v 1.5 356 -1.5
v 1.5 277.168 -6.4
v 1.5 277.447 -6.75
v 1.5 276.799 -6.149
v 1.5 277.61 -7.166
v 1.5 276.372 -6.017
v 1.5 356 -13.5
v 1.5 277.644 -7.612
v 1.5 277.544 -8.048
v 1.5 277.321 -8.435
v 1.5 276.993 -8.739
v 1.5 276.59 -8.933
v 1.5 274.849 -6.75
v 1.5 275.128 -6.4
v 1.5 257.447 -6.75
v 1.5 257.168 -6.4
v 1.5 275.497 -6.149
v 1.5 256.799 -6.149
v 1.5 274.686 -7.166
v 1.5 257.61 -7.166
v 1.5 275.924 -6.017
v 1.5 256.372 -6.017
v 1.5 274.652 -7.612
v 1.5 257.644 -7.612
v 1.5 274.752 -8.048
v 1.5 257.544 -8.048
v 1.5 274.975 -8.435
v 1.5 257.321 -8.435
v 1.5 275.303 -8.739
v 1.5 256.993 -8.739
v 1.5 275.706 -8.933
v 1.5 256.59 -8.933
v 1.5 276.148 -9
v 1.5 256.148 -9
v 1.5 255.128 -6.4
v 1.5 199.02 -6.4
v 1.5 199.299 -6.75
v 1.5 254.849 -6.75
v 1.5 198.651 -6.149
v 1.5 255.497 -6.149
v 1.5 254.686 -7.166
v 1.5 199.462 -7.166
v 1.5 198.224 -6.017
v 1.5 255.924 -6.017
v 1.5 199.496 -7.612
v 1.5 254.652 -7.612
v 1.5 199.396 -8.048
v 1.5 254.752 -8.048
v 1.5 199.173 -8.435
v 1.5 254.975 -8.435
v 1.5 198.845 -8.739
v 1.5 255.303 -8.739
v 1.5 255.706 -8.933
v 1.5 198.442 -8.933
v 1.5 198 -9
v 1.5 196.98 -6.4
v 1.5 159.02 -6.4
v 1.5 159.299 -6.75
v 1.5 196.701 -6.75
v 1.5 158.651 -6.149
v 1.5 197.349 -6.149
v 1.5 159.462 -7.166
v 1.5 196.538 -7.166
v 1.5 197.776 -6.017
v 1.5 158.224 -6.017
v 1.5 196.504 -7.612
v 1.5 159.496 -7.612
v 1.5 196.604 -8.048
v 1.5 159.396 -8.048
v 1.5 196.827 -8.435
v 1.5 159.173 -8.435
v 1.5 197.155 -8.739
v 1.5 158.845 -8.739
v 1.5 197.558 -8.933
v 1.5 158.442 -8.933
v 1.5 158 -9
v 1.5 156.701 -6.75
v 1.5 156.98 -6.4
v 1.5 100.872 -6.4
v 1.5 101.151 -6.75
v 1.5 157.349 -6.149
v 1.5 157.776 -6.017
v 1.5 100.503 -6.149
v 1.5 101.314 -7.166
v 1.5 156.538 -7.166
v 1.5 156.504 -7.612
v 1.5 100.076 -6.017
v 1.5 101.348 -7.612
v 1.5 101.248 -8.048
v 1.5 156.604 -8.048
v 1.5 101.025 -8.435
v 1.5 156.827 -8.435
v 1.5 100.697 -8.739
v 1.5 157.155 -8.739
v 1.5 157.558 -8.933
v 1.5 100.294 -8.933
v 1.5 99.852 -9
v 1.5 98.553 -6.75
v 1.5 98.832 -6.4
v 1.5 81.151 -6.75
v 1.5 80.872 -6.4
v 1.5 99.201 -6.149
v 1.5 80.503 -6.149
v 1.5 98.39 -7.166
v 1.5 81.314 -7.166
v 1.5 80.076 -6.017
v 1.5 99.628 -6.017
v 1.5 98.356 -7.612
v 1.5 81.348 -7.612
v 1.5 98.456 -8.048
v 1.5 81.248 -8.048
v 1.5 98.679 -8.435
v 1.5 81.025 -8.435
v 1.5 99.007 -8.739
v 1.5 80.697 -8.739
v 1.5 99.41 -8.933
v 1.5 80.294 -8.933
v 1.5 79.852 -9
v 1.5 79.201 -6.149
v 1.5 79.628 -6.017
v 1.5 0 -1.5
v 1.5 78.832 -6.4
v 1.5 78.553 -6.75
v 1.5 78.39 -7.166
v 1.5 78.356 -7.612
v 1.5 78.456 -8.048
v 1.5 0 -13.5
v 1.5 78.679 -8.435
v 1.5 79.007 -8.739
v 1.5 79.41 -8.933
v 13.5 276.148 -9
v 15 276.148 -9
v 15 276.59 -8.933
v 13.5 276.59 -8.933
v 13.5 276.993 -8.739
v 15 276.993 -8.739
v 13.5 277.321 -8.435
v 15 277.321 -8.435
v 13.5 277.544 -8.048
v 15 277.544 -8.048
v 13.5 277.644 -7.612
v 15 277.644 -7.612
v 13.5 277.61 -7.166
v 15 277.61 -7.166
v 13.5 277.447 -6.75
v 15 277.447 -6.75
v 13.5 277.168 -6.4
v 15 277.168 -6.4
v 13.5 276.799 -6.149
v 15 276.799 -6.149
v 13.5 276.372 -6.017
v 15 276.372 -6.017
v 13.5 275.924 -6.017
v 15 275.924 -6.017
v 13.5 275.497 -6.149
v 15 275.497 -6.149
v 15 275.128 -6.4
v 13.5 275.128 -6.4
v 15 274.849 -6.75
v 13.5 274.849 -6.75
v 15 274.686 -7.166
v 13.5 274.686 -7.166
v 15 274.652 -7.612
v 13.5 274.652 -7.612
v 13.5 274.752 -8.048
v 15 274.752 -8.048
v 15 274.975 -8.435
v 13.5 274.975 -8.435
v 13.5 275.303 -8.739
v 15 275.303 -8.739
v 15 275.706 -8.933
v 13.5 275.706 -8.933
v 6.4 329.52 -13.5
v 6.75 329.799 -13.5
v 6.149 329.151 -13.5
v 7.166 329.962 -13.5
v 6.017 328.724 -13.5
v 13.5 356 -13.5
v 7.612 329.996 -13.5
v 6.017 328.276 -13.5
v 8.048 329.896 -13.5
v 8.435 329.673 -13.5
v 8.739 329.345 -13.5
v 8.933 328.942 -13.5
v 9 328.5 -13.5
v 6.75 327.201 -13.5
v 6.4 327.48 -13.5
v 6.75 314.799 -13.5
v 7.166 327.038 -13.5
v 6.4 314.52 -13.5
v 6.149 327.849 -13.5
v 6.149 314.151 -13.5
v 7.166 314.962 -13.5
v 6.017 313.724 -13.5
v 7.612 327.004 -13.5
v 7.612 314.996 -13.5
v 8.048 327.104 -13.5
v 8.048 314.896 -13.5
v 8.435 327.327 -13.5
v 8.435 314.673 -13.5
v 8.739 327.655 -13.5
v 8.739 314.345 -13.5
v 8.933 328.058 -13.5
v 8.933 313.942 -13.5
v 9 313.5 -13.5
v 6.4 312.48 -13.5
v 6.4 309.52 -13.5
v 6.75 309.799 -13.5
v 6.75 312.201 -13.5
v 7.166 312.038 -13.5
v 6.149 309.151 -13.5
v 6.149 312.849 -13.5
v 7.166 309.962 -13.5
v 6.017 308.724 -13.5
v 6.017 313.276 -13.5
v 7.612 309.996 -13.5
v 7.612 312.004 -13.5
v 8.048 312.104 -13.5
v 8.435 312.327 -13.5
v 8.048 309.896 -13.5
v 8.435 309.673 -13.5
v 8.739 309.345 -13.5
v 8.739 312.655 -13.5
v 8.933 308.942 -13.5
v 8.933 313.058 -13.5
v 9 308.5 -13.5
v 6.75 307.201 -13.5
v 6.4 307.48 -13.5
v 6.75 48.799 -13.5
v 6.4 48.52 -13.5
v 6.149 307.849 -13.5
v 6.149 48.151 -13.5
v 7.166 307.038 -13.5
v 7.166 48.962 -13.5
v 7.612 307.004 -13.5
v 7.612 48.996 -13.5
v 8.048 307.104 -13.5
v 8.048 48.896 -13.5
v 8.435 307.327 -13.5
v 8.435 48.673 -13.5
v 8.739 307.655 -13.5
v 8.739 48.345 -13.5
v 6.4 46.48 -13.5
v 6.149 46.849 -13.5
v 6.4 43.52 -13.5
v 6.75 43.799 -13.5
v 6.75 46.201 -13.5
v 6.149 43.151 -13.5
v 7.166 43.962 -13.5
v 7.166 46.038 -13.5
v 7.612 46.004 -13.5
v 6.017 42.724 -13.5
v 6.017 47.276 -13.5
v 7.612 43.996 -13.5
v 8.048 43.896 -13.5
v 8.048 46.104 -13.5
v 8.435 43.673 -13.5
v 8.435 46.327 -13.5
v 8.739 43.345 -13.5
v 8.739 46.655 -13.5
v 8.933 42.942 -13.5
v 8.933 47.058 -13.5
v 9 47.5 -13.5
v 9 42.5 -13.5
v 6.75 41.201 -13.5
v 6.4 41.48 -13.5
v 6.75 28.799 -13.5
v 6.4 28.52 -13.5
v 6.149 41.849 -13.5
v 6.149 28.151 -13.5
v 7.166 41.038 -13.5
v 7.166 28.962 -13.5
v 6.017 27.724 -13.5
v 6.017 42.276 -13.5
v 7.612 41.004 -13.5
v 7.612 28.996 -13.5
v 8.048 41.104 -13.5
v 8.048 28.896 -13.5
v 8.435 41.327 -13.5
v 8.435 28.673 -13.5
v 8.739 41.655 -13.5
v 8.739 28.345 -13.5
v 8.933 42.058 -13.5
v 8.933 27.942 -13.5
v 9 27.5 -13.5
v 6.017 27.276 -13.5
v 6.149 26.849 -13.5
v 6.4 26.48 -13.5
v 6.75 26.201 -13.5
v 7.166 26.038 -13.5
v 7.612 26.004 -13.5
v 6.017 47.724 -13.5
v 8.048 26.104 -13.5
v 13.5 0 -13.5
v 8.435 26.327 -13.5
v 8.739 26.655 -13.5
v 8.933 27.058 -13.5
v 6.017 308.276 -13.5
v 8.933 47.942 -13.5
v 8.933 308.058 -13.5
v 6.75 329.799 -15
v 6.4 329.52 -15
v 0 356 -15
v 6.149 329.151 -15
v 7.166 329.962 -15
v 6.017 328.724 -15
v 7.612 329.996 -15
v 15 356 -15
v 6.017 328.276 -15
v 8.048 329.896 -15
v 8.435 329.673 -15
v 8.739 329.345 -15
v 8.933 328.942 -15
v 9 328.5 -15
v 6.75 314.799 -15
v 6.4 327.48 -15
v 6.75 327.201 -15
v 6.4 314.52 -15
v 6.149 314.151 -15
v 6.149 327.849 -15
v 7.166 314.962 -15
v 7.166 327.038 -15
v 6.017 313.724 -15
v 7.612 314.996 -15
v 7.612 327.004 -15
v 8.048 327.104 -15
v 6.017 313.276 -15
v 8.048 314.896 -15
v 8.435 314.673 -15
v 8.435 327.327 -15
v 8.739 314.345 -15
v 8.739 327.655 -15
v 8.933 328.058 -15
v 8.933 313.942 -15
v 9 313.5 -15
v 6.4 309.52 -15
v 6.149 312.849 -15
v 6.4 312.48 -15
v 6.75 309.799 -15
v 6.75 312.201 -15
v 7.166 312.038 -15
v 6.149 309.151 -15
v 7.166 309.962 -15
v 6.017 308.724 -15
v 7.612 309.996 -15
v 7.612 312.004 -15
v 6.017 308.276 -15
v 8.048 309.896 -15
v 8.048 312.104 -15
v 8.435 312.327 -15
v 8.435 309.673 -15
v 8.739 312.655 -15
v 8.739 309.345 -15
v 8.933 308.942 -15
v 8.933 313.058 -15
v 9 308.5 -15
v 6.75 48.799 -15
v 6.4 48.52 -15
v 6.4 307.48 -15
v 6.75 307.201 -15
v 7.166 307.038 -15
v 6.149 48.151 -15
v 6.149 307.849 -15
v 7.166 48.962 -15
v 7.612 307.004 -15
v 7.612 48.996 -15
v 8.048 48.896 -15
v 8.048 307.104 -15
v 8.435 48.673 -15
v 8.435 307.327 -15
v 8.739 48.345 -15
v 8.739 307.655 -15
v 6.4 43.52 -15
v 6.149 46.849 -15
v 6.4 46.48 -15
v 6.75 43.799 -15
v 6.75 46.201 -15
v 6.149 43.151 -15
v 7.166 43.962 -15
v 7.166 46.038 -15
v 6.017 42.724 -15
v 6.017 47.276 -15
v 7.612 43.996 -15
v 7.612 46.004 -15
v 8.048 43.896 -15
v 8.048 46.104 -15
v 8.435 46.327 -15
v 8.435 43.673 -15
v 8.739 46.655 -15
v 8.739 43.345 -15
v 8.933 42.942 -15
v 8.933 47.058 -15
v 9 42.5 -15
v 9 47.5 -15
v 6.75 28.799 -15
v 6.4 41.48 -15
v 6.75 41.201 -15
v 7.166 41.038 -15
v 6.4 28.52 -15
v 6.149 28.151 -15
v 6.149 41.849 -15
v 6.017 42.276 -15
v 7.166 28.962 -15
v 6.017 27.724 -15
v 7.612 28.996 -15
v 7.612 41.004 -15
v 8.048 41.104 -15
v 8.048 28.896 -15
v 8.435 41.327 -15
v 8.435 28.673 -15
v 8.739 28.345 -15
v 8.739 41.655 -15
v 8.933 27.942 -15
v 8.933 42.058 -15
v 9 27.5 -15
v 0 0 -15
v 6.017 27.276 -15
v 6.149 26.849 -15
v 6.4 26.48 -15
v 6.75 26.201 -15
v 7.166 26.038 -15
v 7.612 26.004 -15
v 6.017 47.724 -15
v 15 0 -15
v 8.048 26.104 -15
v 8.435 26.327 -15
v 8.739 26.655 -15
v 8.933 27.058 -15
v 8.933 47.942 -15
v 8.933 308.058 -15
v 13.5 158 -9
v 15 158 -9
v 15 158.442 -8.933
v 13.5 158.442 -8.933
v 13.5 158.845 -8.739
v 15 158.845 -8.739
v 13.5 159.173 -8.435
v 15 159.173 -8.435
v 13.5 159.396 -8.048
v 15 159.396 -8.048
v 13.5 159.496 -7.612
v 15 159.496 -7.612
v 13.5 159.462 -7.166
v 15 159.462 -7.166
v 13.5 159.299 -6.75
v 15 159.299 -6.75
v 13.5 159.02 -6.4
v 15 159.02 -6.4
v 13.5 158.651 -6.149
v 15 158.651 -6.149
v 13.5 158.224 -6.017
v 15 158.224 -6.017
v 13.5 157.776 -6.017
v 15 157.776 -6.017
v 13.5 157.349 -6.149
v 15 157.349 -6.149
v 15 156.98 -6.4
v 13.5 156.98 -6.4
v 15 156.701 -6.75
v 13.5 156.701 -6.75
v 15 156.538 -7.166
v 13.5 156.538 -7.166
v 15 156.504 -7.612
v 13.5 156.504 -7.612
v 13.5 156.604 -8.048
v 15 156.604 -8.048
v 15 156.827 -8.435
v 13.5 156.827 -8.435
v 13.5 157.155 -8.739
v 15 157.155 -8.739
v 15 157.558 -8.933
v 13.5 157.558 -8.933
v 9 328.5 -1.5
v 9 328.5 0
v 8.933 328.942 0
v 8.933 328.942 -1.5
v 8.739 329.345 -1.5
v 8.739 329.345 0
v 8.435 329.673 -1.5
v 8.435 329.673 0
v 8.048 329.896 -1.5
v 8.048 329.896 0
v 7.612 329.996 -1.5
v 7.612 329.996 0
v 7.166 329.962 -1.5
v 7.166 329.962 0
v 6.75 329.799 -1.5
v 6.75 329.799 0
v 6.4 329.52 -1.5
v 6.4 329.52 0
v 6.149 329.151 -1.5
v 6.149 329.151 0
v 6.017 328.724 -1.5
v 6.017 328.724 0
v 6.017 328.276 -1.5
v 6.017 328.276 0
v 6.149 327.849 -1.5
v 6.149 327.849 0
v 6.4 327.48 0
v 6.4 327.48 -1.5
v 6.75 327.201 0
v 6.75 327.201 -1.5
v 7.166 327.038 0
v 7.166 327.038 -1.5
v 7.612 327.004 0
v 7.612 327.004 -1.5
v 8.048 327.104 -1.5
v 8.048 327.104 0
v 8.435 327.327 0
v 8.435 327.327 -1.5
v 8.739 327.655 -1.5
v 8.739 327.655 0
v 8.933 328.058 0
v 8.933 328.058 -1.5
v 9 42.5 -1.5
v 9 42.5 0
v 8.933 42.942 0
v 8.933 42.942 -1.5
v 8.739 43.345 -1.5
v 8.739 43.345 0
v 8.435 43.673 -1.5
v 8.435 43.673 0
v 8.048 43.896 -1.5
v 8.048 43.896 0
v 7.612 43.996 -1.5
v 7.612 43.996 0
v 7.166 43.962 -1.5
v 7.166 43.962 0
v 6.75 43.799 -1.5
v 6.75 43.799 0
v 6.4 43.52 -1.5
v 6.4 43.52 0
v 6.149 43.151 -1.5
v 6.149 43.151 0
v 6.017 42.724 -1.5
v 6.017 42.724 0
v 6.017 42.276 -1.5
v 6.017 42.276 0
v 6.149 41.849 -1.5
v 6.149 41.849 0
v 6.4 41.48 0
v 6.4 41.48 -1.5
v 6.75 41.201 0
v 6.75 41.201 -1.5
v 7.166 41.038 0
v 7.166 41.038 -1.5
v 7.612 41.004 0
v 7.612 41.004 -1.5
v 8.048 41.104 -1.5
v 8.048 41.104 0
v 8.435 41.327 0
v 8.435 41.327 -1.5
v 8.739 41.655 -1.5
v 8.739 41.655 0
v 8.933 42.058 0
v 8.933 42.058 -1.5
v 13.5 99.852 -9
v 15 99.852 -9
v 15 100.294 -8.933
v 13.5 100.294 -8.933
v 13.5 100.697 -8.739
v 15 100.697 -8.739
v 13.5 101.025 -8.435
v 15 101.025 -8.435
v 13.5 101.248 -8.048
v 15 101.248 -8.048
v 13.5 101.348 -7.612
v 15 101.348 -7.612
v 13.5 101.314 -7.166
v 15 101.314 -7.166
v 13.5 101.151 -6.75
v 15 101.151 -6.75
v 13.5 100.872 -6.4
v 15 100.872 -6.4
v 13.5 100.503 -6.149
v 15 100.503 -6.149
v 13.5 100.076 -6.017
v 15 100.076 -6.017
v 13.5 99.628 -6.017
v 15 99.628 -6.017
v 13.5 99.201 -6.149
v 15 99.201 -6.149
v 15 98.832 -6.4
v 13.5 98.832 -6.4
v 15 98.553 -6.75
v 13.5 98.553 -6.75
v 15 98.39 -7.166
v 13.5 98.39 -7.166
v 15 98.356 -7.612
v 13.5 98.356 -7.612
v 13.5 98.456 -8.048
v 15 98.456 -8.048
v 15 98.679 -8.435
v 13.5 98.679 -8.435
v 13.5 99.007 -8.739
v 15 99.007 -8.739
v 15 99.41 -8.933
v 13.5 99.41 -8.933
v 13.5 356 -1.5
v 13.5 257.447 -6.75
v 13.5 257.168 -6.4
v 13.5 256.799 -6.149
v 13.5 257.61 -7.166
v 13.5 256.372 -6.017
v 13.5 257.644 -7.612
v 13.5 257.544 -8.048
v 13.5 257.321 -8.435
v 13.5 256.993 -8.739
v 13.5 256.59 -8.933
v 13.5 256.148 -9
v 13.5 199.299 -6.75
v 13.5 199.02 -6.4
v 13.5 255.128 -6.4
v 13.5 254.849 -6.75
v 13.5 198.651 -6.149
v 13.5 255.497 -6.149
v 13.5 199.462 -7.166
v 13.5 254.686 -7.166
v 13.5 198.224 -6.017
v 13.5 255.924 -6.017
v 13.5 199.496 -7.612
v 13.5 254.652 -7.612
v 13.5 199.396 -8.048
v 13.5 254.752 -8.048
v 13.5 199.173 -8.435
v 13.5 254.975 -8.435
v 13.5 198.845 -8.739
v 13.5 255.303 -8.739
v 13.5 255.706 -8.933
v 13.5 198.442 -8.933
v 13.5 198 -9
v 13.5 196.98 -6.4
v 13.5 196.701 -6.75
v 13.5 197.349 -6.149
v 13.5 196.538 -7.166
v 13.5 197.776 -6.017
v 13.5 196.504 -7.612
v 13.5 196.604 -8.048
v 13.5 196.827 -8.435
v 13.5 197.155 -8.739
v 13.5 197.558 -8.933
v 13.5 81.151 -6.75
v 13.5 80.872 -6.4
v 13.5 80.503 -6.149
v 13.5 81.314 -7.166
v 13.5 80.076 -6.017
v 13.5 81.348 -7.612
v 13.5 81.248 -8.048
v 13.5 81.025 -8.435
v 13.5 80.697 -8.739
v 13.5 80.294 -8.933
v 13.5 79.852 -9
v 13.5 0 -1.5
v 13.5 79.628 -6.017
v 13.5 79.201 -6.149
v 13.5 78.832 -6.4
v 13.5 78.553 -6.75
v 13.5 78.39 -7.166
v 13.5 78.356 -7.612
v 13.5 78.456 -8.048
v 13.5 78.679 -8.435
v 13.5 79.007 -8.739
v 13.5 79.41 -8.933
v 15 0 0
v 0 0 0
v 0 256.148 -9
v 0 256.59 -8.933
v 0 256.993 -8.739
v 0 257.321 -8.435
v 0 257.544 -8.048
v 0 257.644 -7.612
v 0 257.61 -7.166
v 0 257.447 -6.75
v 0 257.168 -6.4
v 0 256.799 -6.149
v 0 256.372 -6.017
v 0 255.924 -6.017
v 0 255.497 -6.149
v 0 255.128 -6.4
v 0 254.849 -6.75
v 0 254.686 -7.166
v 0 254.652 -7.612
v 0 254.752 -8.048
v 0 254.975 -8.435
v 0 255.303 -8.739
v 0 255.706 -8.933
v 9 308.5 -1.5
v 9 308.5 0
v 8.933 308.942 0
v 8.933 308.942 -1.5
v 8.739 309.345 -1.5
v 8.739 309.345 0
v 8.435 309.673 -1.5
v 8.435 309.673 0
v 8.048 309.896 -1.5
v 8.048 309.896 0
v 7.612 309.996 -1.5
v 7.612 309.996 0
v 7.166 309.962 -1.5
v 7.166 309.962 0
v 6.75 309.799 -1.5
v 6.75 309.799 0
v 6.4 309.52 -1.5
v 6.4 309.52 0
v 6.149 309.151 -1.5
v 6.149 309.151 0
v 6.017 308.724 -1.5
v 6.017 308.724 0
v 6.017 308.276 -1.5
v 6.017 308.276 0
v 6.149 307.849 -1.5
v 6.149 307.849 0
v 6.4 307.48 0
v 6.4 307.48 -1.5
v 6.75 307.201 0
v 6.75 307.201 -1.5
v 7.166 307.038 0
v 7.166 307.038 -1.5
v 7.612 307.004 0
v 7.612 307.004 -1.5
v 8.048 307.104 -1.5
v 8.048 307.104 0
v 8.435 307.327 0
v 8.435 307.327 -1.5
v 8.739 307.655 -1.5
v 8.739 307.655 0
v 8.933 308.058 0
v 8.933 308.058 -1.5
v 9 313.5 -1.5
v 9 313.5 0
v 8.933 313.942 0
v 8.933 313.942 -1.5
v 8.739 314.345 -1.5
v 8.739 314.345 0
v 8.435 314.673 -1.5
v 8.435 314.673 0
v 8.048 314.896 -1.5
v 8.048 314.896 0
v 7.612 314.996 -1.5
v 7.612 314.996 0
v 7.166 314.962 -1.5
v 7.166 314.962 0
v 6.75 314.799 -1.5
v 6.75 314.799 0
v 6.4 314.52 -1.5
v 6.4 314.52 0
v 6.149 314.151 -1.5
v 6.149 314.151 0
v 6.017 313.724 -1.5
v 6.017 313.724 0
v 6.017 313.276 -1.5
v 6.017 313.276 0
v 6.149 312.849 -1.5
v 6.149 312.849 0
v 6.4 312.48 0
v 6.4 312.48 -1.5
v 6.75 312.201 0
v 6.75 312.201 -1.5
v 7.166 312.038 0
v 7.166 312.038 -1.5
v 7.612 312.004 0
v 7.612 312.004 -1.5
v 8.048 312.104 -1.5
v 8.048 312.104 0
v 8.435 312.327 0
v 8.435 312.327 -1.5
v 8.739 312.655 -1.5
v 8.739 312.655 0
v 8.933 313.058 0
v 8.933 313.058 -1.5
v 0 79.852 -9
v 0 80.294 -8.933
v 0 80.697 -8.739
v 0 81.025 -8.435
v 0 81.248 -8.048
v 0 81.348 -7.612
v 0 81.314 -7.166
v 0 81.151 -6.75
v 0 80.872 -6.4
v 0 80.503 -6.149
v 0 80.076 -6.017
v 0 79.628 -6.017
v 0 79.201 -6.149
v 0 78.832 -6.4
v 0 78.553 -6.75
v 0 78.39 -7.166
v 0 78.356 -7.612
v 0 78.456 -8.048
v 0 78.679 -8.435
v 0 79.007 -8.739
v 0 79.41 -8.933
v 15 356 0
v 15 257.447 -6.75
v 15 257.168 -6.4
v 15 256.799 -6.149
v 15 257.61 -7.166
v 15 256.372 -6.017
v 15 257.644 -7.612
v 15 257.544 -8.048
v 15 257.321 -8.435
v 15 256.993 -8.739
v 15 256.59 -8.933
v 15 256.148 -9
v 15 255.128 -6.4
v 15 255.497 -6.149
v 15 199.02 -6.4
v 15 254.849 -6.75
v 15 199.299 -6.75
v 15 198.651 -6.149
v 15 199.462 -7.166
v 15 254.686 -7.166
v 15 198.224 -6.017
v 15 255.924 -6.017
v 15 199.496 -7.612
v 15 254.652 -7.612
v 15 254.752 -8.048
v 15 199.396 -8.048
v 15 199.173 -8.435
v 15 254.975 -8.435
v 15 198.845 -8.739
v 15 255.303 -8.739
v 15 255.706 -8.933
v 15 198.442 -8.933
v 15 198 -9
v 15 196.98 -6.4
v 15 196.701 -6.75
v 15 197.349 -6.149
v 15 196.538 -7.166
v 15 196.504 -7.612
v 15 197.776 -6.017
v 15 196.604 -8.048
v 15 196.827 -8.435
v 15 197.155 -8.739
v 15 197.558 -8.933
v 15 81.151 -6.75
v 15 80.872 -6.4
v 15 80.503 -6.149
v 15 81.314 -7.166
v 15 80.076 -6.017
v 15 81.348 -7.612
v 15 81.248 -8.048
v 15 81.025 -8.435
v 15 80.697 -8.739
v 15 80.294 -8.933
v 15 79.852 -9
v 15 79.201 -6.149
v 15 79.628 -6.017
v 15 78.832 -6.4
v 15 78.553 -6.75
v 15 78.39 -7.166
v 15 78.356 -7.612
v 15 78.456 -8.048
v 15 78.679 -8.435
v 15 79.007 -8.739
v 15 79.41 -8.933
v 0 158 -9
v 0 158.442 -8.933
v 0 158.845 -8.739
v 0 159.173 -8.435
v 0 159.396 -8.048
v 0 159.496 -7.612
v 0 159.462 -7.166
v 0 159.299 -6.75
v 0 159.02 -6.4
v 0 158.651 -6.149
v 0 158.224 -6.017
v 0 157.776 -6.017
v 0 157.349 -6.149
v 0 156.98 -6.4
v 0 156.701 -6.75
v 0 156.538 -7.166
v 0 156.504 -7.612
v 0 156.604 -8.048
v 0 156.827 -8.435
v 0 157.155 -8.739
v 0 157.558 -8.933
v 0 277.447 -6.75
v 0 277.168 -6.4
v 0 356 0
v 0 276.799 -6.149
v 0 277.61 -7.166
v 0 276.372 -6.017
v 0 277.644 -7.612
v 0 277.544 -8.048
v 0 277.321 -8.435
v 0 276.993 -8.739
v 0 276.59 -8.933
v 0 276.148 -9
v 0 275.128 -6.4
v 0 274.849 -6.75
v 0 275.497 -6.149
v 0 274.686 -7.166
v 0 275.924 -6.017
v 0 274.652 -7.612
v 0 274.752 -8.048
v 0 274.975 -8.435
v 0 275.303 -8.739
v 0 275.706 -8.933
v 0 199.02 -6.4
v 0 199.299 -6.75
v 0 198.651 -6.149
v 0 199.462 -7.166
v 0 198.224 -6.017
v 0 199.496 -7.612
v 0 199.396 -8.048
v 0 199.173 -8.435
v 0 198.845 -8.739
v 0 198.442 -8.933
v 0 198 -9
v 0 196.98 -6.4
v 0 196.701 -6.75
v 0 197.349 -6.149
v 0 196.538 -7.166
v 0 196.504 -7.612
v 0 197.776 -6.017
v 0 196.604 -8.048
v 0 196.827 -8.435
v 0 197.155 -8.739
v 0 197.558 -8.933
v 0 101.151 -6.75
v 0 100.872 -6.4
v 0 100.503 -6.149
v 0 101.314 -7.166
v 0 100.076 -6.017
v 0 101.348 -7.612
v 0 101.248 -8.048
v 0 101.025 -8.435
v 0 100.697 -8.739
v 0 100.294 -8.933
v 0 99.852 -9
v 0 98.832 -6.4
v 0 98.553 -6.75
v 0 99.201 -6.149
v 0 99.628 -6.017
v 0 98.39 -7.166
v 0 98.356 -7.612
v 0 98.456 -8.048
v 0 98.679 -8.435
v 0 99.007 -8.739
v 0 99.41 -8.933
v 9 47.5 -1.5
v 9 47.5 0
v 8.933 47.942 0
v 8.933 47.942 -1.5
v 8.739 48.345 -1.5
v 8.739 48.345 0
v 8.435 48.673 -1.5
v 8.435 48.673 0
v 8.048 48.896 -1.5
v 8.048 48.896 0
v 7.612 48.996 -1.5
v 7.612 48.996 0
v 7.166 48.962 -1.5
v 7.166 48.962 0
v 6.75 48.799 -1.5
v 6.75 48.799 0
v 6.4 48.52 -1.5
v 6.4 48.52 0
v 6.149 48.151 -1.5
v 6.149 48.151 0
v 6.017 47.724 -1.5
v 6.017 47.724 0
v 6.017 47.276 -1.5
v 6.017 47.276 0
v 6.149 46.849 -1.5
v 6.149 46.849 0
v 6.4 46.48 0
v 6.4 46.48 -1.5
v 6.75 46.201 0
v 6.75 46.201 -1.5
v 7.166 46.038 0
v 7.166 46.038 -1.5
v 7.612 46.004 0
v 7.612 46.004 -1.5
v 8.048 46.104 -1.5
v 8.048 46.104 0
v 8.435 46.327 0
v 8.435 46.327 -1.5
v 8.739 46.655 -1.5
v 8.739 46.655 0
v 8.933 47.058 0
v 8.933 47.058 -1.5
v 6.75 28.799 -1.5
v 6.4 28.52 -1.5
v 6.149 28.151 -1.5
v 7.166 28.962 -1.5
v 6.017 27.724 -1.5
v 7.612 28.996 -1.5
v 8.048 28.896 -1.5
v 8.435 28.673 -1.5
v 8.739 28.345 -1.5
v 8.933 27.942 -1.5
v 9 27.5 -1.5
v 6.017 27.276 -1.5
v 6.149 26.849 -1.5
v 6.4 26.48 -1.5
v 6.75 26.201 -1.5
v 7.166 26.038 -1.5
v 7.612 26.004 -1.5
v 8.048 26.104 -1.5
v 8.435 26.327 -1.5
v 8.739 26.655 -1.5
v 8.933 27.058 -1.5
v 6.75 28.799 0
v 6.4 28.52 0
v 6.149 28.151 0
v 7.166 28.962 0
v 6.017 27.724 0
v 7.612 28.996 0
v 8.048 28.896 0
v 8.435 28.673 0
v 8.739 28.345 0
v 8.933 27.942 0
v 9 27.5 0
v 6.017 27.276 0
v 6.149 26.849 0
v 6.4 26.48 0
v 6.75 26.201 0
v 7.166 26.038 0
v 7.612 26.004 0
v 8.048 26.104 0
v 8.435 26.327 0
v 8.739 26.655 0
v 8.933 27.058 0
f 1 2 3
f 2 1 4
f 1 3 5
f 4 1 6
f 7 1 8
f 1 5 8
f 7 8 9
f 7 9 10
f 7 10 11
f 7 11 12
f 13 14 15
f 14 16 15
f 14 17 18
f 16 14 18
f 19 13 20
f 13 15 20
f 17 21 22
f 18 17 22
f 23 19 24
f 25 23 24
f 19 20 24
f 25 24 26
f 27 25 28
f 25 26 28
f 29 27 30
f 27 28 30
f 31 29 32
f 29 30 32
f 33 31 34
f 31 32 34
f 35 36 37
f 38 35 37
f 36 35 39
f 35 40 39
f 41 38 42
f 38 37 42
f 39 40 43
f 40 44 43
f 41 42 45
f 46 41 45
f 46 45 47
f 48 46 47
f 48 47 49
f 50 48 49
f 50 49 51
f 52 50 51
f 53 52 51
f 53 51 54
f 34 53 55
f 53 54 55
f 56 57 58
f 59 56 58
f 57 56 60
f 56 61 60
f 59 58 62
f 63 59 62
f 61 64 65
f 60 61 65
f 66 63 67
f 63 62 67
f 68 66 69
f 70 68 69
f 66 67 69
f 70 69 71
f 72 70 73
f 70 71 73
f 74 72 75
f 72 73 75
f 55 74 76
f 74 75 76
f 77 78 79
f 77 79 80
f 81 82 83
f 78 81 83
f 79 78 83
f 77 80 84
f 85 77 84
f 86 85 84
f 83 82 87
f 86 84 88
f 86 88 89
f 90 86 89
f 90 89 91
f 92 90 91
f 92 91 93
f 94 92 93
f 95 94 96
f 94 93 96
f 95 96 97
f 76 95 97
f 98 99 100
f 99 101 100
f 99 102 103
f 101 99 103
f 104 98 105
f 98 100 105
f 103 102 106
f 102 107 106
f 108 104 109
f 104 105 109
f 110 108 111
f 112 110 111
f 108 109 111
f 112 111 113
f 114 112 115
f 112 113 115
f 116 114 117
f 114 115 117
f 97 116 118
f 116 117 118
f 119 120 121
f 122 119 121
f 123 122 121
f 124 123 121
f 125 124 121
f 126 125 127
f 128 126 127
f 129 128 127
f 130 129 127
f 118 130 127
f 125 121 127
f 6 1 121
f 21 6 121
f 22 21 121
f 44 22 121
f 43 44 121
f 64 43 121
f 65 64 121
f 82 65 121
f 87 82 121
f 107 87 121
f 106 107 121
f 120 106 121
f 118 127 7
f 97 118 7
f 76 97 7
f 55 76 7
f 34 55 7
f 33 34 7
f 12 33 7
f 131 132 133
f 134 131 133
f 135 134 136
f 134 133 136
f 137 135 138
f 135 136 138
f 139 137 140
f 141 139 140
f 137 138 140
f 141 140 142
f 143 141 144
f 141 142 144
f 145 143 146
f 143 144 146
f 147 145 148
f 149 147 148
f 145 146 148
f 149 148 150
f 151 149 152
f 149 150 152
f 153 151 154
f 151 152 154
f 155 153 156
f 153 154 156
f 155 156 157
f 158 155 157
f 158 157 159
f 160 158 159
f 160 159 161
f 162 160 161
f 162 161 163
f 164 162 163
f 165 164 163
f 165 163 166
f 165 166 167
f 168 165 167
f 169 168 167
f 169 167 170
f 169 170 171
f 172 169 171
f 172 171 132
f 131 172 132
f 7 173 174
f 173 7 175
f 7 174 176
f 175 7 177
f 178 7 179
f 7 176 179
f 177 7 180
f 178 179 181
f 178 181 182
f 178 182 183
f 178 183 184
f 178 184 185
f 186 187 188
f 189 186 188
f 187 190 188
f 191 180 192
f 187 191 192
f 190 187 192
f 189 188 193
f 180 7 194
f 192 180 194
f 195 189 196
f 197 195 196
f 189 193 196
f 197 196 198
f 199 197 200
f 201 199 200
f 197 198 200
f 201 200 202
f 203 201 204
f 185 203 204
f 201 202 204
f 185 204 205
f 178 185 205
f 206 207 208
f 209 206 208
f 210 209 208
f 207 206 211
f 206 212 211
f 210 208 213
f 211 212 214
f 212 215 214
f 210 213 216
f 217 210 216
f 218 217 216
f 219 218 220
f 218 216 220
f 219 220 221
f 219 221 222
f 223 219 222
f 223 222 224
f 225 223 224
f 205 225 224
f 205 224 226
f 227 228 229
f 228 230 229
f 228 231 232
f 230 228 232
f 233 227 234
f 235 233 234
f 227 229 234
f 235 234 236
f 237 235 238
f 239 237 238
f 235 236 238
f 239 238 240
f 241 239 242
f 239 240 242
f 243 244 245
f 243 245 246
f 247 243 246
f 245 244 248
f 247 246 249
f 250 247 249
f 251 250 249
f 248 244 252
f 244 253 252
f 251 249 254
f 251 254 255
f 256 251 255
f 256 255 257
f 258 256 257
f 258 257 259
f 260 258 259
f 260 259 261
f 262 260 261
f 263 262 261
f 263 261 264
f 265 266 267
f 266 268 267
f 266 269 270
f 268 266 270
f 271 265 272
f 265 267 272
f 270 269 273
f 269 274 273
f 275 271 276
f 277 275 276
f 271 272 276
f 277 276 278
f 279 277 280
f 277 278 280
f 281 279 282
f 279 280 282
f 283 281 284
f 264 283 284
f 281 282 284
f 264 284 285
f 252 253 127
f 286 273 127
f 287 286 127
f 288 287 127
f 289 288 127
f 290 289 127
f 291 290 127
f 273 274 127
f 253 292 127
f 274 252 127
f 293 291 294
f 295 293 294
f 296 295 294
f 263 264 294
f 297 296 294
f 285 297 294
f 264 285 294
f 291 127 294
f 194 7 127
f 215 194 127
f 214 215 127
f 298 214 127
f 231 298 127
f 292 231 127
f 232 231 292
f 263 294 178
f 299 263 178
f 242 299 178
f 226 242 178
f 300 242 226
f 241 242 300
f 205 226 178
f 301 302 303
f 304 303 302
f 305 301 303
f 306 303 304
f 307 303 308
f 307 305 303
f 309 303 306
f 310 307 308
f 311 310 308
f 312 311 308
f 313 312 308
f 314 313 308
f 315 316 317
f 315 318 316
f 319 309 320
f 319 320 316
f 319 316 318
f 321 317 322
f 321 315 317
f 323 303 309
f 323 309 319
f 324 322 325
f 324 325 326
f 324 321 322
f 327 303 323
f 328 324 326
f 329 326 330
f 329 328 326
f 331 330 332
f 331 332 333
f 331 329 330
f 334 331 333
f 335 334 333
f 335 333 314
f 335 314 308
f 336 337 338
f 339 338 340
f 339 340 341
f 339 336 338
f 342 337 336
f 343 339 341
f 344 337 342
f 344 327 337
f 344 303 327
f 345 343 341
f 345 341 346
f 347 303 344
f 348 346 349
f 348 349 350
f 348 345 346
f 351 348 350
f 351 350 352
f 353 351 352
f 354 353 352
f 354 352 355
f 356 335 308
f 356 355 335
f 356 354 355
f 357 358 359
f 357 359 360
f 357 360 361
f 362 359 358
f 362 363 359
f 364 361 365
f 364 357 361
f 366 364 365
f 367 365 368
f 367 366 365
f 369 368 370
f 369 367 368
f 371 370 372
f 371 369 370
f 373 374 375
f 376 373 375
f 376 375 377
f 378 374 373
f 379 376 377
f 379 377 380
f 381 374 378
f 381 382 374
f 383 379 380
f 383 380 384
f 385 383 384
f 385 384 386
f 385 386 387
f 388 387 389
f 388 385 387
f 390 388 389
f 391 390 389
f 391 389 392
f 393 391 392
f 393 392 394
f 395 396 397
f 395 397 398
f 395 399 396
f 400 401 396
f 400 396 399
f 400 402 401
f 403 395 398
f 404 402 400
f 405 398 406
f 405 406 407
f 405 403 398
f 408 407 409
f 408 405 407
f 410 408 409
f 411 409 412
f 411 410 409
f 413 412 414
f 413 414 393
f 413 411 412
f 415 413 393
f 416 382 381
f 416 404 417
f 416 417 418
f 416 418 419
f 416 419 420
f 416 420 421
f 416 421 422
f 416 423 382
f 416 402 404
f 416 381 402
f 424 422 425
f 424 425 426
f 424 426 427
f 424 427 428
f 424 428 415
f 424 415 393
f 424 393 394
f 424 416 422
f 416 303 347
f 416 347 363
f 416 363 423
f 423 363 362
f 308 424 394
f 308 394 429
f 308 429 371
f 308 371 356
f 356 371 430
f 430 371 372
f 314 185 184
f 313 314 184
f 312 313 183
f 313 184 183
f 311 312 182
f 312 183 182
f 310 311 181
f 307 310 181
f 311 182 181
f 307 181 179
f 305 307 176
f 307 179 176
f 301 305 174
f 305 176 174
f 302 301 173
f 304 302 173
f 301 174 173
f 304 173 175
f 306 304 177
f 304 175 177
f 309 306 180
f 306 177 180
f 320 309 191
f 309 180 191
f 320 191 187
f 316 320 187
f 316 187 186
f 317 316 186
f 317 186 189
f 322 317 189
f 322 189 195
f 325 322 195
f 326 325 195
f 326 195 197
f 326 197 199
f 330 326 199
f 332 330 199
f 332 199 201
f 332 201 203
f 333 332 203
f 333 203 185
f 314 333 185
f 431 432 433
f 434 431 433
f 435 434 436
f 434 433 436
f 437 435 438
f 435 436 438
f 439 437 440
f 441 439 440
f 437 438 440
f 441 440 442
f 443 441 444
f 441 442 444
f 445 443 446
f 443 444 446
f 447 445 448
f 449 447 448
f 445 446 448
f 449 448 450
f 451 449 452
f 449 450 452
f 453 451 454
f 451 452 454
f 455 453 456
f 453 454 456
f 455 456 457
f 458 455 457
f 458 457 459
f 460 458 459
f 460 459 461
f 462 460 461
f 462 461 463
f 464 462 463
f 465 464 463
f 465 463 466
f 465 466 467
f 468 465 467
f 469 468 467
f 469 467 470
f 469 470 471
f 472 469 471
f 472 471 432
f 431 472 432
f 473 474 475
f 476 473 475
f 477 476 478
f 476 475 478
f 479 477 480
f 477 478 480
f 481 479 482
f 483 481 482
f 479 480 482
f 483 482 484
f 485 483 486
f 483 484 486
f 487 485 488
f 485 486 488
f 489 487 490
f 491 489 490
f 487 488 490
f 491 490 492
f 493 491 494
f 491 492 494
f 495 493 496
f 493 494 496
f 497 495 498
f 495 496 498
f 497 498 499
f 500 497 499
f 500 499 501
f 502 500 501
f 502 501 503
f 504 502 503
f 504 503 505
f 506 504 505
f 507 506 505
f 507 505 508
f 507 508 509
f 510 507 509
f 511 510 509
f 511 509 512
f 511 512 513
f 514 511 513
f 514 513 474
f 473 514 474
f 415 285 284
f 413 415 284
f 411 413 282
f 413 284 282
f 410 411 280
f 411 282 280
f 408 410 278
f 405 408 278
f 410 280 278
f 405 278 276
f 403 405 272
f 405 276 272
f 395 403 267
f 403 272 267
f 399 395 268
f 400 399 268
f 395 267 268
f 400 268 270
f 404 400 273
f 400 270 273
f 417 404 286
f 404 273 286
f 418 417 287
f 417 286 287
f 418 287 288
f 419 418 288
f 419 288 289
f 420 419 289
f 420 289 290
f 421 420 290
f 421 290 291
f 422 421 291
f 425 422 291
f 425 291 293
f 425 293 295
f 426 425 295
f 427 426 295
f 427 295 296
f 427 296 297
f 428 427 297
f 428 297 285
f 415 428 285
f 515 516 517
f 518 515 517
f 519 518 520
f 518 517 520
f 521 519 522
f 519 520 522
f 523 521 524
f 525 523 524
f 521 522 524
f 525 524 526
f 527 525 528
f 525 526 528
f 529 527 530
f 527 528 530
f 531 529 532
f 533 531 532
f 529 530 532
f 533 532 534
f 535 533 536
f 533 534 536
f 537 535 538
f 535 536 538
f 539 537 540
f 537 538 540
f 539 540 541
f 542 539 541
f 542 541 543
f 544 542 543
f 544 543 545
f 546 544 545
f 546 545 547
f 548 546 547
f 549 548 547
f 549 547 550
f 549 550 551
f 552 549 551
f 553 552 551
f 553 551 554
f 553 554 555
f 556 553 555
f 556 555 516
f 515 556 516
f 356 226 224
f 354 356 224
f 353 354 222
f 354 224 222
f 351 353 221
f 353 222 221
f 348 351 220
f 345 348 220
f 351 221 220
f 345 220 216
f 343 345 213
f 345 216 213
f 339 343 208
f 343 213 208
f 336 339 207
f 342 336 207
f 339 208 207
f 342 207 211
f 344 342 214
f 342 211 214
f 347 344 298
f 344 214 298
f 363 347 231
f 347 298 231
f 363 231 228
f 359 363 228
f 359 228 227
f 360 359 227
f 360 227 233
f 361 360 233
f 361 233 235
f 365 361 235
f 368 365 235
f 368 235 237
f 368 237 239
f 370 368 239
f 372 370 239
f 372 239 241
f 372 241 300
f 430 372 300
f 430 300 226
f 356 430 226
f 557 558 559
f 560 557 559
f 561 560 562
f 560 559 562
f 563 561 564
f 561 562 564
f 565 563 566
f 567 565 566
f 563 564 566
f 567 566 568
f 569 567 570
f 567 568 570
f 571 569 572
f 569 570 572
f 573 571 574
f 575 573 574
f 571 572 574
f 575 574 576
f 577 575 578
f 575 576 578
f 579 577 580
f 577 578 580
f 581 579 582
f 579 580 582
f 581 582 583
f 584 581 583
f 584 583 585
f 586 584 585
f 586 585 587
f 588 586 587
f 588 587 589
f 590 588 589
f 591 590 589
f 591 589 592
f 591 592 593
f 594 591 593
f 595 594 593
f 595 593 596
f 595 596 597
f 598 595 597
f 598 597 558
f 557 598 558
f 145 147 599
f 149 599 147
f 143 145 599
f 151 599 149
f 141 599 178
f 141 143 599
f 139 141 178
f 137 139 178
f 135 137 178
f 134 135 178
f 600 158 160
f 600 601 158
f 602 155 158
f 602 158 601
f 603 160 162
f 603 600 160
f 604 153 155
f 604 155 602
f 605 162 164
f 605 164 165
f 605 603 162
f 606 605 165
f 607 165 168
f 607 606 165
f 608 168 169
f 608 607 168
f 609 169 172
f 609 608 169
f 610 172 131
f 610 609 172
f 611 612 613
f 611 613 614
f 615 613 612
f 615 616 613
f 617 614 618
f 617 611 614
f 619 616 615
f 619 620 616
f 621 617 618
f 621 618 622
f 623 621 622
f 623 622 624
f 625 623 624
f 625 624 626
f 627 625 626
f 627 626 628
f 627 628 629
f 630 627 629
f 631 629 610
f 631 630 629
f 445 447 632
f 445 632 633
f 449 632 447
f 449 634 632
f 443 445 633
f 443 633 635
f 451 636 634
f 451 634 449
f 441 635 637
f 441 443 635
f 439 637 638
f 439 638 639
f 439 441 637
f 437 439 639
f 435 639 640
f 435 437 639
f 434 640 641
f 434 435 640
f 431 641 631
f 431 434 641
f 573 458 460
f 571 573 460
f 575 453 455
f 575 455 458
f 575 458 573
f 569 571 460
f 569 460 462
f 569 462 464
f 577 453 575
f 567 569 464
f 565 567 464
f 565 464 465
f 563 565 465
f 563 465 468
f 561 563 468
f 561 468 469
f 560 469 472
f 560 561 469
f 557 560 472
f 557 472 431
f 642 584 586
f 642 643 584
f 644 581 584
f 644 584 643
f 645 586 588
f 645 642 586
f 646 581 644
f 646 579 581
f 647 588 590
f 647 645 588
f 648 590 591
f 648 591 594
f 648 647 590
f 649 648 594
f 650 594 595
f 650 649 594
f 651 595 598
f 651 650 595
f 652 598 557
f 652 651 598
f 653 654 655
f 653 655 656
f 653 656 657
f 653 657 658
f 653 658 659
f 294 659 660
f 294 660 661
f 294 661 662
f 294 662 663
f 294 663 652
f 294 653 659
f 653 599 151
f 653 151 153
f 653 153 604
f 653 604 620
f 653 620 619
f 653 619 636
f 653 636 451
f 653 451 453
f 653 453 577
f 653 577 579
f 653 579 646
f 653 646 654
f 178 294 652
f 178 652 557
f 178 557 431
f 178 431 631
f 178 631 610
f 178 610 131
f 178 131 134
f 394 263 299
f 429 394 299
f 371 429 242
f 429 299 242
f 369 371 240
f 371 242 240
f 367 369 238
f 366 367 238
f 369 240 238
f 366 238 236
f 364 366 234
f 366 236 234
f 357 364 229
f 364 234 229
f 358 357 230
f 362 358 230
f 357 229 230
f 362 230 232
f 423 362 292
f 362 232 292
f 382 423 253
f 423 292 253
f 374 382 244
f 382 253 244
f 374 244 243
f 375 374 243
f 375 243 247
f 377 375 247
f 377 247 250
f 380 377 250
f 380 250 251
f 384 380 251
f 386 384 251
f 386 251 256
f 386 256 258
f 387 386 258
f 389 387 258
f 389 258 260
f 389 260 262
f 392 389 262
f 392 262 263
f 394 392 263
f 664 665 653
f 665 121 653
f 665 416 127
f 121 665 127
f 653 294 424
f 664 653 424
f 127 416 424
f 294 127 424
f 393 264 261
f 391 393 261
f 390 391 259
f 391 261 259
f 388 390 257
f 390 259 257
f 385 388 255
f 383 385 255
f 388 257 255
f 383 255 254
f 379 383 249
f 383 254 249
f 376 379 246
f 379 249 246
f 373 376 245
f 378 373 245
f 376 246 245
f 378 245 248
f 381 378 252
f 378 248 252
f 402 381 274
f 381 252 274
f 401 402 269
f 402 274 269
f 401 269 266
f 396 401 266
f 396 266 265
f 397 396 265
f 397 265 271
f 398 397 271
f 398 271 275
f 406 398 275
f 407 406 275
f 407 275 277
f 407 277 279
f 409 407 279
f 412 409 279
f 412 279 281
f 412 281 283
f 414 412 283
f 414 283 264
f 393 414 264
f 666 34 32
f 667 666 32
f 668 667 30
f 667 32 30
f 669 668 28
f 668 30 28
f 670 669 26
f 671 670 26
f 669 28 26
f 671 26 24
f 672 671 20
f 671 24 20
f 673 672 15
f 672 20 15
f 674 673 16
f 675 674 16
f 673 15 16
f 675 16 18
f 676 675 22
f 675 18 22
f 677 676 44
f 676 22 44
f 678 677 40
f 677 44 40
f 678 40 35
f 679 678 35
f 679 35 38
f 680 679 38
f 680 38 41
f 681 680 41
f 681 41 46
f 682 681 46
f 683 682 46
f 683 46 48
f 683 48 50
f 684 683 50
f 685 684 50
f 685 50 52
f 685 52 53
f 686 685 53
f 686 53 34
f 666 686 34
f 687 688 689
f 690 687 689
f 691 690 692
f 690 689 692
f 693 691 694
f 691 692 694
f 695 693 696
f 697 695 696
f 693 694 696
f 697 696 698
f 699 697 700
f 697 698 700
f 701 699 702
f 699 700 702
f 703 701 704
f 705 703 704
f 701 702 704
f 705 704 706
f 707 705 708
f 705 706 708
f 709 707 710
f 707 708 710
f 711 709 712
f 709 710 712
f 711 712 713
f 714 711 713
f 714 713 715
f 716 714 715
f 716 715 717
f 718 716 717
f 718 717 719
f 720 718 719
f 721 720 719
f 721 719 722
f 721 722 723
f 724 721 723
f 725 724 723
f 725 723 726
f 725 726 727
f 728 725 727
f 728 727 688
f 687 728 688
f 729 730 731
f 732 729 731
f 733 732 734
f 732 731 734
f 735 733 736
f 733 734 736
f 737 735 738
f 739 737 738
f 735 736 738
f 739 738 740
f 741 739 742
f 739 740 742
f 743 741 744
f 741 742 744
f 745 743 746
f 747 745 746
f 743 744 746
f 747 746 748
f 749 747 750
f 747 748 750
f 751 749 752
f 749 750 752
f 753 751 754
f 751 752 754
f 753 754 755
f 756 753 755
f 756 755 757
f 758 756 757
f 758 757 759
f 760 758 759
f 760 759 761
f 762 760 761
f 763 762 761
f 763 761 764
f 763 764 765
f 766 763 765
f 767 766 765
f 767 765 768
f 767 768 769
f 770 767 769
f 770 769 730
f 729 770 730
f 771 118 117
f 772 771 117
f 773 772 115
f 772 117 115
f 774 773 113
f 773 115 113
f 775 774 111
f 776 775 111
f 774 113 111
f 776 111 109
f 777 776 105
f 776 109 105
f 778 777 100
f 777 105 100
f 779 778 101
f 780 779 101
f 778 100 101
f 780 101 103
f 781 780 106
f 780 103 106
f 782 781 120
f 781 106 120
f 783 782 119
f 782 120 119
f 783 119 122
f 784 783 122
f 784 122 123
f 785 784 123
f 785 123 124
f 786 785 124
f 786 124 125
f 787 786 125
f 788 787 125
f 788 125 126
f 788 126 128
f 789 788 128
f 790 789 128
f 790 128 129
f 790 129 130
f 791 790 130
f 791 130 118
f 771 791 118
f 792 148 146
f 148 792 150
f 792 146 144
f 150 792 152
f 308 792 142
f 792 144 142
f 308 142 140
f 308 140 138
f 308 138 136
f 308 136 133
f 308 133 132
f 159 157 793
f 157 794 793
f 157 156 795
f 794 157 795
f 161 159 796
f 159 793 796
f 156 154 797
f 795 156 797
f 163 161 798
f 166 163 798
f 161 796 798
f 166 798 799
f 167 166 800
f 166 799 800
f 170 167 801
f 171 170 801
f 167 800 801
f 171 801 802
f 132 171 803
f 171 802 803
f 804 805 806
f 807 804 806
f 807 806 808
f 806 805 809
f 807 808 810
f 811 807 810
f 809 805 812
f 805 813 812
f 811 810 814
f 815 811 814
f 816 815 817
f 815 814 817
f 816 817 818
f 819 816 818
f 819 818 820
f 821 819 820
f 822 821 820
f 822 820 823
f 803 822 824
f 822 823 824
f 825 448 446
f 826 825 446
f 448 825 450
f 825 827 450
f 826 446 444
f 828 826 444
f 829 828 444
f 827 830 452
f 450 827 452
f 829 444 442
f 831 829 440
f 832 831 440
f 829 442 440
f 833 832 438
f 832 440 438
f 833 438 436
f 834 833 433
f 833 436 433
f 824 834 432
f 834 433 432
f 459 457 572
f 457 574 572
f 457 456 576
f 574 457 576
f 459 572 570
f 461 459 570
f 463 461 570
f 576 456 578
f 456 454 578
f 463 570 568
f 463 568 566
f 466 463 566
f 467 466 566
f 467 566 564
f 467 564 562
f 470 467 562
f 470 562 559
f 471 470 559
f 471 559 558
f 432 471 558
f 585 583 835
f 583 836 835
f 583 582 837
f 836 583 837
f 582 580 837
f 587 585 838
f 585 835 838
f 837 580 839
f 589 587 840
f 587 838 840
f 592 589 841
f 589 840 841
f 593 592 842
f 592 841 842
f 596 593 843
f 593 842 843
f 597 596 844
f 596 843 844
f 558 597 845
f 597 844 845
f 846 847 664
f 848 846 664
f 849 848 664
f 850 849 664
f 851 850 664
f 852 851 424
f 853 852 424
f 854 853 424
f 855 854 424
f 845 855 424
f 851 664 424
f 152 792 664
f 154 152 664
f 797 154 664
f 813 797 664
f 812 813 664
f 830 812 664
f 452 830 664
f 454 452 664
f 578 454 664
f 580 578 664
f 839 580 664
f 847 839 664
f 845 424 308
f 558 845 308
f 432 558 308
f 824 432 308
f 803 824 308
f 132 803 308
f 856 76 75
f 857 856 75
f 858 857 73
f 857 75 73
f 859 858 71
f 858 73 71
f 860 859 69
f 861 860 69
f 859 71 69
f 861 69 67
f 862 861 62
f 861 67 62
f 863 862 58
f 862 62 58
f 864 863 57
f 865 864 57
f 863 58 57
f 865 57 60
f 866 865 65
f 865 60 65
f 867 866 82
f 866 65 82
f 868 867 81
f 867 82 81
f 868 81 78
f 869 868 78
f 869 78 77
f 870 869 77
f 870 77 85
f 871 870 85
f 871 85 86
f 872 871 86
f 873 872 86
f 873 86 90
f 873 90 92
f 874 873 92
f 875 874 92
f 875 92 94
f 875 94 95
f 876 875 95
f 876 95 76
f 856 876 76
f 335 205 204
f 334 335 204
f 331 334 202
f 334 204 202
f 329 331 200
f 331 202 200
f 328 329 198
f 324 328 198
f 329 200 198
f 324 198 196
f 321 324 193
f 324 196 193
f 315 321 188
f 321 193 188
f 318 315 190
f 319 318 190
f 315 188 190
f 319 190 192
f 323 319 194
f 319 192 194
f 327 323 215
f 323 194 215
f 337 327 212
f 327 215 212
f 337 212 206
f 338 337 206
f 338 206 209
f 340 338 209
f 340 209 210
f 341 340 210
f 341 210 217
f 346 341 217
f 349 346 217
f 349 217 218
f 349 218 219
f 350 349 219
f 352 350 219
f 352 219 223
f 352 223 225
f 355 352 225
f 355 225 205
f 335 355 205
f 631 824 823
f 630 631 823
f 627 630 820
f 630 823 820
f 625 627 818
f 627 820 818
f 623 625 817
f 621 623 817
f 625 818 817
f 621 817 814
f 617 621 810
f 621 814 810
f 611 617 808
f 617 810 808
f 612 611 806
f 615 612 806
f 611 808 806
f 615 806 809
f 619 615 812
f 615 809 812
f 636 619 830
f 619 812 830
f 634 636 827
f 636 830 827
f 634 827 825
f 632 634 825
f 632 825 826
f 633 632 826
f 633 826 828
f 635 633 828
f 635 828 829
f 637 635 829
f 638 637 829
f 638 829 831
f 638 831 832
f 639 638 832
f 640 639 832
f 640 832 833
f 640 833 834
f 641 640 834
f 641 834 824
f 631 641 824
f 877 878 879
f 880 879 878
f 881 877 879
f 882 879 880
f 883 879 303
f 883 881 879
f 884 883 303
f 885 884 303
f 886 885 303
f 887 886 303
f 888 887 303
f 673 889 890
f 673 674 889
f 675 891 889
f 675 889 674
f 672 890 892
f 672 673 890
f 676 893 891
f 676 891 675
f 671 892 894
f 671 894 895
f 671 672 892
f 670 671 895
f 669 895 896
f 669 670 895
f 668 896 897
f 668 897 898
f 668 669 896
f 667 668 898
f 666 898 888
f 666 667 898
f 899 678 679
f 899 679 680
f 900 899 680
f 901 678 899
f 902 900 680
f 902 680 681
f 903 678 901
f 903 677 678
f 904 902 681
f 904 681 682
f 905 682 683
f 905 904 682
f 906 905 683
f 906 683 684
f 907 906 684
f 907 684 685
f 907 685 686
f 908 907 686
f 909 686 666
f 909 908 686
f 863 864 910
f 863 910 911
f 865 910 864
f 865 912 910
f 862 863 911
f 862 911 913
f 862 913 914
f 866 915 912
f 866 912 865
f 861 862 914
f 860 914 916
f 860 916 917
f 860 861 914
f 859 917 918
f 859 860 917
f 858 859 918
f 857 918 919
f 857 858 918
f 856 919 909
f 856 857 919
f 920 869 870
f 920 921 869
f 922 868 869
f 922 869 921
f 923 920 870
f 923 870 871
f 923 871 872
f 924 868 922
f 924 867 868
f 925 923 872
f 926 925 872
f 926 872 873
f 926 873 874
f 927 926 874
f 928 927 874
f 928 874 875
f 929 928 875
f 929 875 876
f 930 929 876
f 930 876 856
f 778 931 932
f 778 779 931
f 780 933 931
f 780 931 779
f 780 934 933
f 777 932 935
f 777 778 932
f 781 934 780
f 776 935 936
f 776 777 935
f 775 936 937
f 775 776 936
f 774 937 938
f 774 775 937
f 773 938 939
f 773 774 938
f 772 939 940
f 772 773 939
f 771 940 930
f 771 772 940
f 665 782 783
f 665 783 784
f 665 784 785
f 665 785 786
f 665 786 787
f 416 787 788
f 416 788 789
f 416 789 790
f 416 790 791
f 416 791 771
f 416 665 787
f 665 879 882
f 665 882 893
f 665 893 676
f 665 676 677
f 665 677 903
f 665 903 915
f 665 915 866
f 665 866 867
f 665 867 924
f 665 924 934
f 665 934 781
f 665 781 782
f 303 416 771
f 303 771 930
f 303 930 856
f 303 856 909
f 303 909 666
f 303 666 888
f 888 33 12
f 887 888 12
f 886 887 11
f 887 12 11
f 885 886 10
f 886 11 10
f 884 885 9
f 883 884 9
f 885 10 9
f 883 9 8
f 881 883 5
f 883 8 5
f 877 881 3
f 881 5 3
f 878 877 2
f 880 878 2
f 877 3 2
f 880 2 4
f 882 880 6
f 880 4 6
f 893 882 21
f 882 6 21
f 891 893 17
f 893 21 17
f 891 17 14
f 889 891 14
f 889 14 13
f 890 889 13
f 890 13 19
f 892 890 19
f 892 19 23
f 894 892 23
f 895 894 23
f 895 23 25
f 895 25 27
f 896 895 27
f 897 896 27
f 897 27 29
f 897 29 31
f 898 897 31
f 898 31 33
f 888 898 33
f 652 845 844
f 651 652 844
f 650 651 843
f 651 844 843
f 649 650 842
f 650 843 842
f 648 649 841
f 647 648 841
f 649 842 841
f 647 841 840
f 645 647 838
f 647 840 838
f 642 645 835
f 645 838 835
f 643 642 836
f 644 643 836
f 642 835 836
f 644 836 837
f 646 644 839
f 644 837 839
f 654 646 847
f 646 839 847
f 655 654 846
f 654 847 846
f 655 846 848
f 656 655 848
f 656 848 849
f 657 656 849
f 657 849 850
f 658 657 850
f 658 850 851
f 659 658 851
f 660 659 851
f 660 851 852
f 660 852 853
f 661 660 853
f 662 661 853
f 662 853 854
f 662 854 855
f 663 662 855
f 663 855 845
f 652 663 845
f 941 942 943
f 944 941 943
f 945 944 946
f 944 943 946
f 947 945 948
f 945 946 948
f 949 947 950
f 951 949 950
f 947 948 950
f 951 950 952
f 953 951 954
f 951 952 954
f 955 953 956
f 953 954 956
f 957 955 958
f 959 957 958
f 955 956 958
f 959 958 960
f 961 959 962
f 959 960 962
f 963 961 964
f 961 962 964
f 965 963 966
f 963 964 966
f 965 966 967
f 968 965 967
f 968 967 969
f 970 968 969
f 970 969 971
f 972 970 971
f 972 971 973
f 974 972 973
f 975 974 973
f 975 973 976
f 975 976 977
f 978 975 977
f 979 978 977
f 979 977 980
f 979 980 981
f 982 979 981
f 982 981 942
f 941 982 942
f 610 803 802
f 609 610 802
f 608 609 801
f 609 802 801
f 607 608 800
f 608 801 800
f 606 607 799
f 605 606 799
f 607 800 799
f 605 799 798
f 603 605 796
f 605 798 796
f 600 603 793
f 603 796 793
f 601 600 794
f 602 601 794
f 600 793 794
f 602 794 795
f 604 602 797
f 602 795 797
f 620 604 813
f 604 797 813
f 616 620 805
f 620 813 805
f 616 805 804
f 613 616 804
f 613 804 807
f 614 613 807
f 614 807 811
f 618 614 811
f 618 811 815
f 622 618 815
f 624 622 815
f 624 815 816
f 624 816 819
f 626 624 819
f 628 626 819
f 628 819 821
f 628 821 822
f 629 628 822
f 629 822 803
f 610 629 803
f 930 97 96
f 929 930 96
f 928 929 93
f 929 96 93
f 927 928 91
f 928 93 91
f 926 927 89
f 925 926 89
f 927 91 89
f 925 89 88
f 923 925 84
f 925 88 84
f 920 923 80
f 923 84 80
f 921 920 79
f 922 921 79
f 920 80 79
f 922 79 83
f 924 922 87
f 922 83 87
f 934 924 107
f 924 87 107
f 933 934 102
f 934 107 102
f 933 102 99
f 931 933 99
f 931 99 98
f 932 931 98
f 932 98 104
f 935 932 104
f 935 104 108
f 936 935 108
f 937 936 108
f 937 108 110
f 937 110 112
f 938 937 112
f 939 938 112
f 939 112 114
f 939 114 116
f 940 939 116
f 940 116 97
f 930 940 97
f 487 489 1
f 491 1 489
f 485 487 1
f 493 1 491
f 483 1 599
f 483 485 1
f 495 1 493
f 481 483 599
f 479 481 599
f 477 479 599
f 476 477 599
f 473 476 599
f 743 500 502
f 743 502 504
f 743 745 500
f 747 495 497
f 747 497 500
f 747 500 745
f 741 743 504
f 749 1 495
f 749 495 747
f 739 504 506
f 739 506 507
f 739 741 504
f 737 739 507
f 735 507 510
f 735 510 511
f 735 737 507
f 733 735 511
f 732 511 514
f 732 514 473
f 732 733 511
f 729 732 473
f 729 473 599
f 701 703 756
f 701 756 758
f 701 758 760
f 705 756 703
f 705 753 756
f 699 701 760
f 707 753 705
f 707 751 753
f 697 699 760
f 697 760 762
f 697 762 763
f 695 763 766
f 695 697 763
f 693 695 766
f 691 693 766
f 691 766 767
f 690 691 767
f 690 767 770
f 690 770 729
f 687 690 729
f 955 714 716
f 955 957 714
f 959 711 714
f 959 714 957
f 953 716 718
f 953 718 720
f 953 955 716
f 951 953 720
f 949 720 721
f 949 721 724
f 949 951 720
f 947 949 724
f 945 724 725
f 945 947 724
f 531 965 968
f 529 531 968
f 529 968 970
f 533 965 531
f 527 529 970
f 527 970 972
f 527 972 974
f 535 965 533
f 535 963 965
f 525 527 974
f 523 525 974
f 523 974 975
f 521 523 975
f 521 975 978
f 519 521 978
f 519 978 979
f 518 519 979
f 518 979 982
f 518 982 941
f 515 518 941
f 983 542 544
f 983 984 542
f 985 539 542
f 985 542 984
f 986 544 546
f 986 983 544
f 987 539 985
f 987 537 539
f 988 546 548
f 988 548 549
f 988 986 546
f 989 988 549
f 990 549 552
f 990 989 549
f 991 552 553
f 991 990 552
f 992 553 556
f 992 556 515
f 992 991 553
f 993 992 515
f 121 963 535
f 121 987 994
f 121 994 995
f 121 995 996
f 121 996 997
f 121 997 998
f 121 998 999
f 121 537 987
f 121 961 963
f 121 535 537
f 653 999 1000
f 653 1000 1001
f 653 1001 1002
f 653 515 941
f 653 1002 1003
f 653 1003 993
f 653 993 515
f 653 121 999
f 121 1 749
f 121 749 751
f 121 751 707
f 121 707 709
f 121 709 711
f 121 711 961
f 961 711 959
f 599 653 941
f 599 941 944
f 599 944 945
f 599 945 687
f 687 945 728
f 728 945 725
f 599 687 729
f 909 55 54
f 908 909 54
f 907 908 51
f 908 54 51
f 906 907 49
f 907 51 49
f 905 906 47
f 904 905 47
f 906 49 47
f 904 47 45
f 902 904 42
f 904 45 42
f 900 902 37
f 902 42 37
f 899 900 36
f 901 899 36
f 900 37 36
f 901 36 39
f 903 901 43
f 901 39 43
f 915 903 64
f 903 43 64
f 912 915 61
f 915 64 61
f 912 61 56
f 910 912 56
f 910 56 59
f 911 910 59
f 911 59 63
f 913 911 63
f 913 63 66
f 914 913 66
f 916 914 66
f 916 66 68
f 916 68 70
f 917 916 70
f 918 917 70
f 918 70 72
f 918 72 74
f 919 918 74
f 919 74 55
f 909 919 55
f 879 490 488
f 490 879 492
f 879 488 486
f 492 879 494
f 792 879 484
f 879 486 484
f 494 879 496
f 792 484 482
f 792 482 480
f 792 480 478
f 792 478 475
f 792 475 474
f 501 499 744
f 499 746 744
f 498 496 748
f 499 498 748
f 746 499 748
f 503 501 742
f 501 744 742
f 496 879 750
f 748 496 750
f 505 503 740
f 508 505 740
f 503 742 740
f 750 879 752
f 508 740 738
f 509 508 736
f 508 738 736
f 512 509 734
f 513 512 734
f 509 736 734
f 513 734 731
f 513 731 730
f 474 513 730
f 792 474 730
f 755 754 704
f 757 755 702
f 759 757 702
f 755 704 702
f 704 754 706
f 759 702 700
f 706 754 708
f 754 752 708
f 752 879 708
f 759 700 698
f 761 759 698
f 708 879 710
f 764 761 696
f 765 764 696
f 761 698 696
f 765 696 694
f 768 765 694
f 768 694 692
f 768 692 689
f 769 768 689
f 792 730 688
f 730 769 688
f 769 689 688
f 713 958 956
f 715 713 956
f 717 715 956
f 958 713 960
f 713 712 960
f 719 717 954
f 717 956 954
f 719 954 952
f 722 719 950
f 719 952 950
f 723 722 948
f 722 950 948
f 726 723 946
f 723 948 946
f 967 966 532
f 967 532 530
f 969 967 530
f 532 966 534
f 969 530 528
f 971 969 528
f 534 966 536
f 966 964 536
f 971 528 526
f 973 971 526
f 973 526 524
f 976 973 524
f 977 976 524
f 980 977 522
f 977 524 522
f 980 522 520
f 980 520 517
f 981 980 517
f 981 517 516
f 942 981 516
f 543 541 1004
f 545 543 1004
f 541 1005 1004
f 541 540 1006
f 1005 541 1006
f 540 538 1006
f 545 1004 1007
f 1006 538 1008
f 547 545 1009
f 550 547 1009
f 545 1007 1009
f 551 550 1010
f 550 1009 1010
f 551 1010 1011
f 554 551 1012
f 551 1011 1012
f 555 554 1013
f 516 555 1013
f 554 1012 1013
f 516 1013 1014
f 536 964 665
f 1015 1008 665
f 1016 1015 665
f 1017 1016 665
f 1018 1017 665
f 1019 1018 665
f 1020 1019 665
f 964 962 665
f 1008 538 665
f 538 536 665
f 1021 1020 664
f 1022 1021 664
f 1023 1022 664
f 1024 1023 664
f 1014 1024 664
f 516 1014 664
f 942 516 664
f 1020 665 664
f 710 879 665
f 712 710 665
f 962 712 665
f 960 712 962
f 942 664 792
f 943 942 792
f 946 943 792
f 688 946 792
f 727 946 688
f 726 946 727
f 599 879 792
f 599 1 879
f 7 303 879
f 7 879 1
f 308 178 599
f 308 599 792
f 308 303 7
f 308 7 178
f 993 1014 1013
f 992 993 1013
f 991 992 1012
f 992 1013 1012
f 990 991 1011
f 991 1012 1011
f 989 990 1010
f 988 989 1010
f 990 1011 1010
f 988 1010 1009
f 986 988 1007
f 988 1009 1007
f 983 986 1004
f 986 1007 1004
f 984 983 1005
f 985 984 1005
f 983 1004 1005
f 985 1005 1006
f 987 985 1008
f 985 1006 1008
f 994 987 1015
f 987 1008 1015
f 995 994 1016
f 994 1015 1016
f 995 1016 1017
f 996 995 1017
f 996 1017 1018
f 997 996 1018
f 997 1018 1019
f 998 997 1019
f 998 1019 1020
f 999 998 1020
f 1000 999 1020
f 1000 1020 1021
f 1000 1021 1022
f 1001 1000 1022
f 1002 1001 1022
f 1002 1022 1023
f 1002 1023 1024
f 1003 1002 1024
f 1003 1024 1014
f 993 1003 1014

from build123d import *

# Parameters (mm, degrees)
SKETCH1_W           = 15
SKETCH1_H           = 15
SKETCH1_W_2         = 12
SKETCH1_H_2         = 12
EXTRUDE_THIN1_DEPTH = 356
SKETCH2_R           = 1.5
CUT_EXTRUDE1_DEPTH  = 357.631462437
SKETCH3_R           = 1.5
CUT_EXTRUDE2_DEPTH  = 357.631462437


with BuildPart() as part:
    # Sketch1 → Extrude-Thin1 (new body)
    with BuildSketch(Plane(origin=(0, 0, 0), x_dir=(1, 0, 0), z_dir=(0, 1, 0))):
        with Locations((7.5, 7.5)):
            Rectangle(SKETCH1_W, SKETCH1_H)
        with Locations((7.5, 7.5)):
            Rectangle(SKETCH1_W_2, SKETCH1_H_2, mode=Mode.SUBTRACT)
    extrude(amount=EXTRUDE_THIN1_DEPTH)

    # Sketch2 (on Front Plane) → Cut-Extrude1 (cut, through all)
    with BuildSketch(Plane.XY):
        with Locations((7.5, 27.5)):
            Circle(SKETCH2_R)
        with Locations((7.5, 47.5)):
            Circle(SKETCH2_R)
        with Locations((7.5, 42.5)):
            Circle(SKETCH2_R)
        with Locations((7.5, 328.5)):
            Circle(SKETCH2_R)
        with Locations((7.5, 313.5)):
            Circle(SKETCH2_R)
        with Locations((7.5, 308.5)):
            Circle(SKETCH2_R)
    extrude(amount=-CUT_EXTRUDE1_DEPTH, mode=Mode.SUBTRACT)

    # Sketch3 → Cut-Extrude2 (cut, through all)
    with BuildSketch(Plane(origin=(15, 0, 0), x_dir=(0, 0, -1), z_dir=(1, 0, 0))):
        with Locations((7.5, 276.148)):
            Circle(SKETCH3_R)
        with Locations((7.5, 256.148)):
            Circle(SKETCH3_R)
        with Locations((7.5, 198)):
            Circle(SKETCH3_R)
        with Locations((7.5, 158)):
            Circle(SKETCH3_R)
        with Locations((7.5, 99.852)):
            Circle(SKETCH3_R)
        with Locations((7.5, 79.852)):
            Circle(SKETCH3_R)
    extrude(amount=-CUT_EXTRUDE2_DEPTH, mode=Mode.SUBTRACT)


solid = part.part
